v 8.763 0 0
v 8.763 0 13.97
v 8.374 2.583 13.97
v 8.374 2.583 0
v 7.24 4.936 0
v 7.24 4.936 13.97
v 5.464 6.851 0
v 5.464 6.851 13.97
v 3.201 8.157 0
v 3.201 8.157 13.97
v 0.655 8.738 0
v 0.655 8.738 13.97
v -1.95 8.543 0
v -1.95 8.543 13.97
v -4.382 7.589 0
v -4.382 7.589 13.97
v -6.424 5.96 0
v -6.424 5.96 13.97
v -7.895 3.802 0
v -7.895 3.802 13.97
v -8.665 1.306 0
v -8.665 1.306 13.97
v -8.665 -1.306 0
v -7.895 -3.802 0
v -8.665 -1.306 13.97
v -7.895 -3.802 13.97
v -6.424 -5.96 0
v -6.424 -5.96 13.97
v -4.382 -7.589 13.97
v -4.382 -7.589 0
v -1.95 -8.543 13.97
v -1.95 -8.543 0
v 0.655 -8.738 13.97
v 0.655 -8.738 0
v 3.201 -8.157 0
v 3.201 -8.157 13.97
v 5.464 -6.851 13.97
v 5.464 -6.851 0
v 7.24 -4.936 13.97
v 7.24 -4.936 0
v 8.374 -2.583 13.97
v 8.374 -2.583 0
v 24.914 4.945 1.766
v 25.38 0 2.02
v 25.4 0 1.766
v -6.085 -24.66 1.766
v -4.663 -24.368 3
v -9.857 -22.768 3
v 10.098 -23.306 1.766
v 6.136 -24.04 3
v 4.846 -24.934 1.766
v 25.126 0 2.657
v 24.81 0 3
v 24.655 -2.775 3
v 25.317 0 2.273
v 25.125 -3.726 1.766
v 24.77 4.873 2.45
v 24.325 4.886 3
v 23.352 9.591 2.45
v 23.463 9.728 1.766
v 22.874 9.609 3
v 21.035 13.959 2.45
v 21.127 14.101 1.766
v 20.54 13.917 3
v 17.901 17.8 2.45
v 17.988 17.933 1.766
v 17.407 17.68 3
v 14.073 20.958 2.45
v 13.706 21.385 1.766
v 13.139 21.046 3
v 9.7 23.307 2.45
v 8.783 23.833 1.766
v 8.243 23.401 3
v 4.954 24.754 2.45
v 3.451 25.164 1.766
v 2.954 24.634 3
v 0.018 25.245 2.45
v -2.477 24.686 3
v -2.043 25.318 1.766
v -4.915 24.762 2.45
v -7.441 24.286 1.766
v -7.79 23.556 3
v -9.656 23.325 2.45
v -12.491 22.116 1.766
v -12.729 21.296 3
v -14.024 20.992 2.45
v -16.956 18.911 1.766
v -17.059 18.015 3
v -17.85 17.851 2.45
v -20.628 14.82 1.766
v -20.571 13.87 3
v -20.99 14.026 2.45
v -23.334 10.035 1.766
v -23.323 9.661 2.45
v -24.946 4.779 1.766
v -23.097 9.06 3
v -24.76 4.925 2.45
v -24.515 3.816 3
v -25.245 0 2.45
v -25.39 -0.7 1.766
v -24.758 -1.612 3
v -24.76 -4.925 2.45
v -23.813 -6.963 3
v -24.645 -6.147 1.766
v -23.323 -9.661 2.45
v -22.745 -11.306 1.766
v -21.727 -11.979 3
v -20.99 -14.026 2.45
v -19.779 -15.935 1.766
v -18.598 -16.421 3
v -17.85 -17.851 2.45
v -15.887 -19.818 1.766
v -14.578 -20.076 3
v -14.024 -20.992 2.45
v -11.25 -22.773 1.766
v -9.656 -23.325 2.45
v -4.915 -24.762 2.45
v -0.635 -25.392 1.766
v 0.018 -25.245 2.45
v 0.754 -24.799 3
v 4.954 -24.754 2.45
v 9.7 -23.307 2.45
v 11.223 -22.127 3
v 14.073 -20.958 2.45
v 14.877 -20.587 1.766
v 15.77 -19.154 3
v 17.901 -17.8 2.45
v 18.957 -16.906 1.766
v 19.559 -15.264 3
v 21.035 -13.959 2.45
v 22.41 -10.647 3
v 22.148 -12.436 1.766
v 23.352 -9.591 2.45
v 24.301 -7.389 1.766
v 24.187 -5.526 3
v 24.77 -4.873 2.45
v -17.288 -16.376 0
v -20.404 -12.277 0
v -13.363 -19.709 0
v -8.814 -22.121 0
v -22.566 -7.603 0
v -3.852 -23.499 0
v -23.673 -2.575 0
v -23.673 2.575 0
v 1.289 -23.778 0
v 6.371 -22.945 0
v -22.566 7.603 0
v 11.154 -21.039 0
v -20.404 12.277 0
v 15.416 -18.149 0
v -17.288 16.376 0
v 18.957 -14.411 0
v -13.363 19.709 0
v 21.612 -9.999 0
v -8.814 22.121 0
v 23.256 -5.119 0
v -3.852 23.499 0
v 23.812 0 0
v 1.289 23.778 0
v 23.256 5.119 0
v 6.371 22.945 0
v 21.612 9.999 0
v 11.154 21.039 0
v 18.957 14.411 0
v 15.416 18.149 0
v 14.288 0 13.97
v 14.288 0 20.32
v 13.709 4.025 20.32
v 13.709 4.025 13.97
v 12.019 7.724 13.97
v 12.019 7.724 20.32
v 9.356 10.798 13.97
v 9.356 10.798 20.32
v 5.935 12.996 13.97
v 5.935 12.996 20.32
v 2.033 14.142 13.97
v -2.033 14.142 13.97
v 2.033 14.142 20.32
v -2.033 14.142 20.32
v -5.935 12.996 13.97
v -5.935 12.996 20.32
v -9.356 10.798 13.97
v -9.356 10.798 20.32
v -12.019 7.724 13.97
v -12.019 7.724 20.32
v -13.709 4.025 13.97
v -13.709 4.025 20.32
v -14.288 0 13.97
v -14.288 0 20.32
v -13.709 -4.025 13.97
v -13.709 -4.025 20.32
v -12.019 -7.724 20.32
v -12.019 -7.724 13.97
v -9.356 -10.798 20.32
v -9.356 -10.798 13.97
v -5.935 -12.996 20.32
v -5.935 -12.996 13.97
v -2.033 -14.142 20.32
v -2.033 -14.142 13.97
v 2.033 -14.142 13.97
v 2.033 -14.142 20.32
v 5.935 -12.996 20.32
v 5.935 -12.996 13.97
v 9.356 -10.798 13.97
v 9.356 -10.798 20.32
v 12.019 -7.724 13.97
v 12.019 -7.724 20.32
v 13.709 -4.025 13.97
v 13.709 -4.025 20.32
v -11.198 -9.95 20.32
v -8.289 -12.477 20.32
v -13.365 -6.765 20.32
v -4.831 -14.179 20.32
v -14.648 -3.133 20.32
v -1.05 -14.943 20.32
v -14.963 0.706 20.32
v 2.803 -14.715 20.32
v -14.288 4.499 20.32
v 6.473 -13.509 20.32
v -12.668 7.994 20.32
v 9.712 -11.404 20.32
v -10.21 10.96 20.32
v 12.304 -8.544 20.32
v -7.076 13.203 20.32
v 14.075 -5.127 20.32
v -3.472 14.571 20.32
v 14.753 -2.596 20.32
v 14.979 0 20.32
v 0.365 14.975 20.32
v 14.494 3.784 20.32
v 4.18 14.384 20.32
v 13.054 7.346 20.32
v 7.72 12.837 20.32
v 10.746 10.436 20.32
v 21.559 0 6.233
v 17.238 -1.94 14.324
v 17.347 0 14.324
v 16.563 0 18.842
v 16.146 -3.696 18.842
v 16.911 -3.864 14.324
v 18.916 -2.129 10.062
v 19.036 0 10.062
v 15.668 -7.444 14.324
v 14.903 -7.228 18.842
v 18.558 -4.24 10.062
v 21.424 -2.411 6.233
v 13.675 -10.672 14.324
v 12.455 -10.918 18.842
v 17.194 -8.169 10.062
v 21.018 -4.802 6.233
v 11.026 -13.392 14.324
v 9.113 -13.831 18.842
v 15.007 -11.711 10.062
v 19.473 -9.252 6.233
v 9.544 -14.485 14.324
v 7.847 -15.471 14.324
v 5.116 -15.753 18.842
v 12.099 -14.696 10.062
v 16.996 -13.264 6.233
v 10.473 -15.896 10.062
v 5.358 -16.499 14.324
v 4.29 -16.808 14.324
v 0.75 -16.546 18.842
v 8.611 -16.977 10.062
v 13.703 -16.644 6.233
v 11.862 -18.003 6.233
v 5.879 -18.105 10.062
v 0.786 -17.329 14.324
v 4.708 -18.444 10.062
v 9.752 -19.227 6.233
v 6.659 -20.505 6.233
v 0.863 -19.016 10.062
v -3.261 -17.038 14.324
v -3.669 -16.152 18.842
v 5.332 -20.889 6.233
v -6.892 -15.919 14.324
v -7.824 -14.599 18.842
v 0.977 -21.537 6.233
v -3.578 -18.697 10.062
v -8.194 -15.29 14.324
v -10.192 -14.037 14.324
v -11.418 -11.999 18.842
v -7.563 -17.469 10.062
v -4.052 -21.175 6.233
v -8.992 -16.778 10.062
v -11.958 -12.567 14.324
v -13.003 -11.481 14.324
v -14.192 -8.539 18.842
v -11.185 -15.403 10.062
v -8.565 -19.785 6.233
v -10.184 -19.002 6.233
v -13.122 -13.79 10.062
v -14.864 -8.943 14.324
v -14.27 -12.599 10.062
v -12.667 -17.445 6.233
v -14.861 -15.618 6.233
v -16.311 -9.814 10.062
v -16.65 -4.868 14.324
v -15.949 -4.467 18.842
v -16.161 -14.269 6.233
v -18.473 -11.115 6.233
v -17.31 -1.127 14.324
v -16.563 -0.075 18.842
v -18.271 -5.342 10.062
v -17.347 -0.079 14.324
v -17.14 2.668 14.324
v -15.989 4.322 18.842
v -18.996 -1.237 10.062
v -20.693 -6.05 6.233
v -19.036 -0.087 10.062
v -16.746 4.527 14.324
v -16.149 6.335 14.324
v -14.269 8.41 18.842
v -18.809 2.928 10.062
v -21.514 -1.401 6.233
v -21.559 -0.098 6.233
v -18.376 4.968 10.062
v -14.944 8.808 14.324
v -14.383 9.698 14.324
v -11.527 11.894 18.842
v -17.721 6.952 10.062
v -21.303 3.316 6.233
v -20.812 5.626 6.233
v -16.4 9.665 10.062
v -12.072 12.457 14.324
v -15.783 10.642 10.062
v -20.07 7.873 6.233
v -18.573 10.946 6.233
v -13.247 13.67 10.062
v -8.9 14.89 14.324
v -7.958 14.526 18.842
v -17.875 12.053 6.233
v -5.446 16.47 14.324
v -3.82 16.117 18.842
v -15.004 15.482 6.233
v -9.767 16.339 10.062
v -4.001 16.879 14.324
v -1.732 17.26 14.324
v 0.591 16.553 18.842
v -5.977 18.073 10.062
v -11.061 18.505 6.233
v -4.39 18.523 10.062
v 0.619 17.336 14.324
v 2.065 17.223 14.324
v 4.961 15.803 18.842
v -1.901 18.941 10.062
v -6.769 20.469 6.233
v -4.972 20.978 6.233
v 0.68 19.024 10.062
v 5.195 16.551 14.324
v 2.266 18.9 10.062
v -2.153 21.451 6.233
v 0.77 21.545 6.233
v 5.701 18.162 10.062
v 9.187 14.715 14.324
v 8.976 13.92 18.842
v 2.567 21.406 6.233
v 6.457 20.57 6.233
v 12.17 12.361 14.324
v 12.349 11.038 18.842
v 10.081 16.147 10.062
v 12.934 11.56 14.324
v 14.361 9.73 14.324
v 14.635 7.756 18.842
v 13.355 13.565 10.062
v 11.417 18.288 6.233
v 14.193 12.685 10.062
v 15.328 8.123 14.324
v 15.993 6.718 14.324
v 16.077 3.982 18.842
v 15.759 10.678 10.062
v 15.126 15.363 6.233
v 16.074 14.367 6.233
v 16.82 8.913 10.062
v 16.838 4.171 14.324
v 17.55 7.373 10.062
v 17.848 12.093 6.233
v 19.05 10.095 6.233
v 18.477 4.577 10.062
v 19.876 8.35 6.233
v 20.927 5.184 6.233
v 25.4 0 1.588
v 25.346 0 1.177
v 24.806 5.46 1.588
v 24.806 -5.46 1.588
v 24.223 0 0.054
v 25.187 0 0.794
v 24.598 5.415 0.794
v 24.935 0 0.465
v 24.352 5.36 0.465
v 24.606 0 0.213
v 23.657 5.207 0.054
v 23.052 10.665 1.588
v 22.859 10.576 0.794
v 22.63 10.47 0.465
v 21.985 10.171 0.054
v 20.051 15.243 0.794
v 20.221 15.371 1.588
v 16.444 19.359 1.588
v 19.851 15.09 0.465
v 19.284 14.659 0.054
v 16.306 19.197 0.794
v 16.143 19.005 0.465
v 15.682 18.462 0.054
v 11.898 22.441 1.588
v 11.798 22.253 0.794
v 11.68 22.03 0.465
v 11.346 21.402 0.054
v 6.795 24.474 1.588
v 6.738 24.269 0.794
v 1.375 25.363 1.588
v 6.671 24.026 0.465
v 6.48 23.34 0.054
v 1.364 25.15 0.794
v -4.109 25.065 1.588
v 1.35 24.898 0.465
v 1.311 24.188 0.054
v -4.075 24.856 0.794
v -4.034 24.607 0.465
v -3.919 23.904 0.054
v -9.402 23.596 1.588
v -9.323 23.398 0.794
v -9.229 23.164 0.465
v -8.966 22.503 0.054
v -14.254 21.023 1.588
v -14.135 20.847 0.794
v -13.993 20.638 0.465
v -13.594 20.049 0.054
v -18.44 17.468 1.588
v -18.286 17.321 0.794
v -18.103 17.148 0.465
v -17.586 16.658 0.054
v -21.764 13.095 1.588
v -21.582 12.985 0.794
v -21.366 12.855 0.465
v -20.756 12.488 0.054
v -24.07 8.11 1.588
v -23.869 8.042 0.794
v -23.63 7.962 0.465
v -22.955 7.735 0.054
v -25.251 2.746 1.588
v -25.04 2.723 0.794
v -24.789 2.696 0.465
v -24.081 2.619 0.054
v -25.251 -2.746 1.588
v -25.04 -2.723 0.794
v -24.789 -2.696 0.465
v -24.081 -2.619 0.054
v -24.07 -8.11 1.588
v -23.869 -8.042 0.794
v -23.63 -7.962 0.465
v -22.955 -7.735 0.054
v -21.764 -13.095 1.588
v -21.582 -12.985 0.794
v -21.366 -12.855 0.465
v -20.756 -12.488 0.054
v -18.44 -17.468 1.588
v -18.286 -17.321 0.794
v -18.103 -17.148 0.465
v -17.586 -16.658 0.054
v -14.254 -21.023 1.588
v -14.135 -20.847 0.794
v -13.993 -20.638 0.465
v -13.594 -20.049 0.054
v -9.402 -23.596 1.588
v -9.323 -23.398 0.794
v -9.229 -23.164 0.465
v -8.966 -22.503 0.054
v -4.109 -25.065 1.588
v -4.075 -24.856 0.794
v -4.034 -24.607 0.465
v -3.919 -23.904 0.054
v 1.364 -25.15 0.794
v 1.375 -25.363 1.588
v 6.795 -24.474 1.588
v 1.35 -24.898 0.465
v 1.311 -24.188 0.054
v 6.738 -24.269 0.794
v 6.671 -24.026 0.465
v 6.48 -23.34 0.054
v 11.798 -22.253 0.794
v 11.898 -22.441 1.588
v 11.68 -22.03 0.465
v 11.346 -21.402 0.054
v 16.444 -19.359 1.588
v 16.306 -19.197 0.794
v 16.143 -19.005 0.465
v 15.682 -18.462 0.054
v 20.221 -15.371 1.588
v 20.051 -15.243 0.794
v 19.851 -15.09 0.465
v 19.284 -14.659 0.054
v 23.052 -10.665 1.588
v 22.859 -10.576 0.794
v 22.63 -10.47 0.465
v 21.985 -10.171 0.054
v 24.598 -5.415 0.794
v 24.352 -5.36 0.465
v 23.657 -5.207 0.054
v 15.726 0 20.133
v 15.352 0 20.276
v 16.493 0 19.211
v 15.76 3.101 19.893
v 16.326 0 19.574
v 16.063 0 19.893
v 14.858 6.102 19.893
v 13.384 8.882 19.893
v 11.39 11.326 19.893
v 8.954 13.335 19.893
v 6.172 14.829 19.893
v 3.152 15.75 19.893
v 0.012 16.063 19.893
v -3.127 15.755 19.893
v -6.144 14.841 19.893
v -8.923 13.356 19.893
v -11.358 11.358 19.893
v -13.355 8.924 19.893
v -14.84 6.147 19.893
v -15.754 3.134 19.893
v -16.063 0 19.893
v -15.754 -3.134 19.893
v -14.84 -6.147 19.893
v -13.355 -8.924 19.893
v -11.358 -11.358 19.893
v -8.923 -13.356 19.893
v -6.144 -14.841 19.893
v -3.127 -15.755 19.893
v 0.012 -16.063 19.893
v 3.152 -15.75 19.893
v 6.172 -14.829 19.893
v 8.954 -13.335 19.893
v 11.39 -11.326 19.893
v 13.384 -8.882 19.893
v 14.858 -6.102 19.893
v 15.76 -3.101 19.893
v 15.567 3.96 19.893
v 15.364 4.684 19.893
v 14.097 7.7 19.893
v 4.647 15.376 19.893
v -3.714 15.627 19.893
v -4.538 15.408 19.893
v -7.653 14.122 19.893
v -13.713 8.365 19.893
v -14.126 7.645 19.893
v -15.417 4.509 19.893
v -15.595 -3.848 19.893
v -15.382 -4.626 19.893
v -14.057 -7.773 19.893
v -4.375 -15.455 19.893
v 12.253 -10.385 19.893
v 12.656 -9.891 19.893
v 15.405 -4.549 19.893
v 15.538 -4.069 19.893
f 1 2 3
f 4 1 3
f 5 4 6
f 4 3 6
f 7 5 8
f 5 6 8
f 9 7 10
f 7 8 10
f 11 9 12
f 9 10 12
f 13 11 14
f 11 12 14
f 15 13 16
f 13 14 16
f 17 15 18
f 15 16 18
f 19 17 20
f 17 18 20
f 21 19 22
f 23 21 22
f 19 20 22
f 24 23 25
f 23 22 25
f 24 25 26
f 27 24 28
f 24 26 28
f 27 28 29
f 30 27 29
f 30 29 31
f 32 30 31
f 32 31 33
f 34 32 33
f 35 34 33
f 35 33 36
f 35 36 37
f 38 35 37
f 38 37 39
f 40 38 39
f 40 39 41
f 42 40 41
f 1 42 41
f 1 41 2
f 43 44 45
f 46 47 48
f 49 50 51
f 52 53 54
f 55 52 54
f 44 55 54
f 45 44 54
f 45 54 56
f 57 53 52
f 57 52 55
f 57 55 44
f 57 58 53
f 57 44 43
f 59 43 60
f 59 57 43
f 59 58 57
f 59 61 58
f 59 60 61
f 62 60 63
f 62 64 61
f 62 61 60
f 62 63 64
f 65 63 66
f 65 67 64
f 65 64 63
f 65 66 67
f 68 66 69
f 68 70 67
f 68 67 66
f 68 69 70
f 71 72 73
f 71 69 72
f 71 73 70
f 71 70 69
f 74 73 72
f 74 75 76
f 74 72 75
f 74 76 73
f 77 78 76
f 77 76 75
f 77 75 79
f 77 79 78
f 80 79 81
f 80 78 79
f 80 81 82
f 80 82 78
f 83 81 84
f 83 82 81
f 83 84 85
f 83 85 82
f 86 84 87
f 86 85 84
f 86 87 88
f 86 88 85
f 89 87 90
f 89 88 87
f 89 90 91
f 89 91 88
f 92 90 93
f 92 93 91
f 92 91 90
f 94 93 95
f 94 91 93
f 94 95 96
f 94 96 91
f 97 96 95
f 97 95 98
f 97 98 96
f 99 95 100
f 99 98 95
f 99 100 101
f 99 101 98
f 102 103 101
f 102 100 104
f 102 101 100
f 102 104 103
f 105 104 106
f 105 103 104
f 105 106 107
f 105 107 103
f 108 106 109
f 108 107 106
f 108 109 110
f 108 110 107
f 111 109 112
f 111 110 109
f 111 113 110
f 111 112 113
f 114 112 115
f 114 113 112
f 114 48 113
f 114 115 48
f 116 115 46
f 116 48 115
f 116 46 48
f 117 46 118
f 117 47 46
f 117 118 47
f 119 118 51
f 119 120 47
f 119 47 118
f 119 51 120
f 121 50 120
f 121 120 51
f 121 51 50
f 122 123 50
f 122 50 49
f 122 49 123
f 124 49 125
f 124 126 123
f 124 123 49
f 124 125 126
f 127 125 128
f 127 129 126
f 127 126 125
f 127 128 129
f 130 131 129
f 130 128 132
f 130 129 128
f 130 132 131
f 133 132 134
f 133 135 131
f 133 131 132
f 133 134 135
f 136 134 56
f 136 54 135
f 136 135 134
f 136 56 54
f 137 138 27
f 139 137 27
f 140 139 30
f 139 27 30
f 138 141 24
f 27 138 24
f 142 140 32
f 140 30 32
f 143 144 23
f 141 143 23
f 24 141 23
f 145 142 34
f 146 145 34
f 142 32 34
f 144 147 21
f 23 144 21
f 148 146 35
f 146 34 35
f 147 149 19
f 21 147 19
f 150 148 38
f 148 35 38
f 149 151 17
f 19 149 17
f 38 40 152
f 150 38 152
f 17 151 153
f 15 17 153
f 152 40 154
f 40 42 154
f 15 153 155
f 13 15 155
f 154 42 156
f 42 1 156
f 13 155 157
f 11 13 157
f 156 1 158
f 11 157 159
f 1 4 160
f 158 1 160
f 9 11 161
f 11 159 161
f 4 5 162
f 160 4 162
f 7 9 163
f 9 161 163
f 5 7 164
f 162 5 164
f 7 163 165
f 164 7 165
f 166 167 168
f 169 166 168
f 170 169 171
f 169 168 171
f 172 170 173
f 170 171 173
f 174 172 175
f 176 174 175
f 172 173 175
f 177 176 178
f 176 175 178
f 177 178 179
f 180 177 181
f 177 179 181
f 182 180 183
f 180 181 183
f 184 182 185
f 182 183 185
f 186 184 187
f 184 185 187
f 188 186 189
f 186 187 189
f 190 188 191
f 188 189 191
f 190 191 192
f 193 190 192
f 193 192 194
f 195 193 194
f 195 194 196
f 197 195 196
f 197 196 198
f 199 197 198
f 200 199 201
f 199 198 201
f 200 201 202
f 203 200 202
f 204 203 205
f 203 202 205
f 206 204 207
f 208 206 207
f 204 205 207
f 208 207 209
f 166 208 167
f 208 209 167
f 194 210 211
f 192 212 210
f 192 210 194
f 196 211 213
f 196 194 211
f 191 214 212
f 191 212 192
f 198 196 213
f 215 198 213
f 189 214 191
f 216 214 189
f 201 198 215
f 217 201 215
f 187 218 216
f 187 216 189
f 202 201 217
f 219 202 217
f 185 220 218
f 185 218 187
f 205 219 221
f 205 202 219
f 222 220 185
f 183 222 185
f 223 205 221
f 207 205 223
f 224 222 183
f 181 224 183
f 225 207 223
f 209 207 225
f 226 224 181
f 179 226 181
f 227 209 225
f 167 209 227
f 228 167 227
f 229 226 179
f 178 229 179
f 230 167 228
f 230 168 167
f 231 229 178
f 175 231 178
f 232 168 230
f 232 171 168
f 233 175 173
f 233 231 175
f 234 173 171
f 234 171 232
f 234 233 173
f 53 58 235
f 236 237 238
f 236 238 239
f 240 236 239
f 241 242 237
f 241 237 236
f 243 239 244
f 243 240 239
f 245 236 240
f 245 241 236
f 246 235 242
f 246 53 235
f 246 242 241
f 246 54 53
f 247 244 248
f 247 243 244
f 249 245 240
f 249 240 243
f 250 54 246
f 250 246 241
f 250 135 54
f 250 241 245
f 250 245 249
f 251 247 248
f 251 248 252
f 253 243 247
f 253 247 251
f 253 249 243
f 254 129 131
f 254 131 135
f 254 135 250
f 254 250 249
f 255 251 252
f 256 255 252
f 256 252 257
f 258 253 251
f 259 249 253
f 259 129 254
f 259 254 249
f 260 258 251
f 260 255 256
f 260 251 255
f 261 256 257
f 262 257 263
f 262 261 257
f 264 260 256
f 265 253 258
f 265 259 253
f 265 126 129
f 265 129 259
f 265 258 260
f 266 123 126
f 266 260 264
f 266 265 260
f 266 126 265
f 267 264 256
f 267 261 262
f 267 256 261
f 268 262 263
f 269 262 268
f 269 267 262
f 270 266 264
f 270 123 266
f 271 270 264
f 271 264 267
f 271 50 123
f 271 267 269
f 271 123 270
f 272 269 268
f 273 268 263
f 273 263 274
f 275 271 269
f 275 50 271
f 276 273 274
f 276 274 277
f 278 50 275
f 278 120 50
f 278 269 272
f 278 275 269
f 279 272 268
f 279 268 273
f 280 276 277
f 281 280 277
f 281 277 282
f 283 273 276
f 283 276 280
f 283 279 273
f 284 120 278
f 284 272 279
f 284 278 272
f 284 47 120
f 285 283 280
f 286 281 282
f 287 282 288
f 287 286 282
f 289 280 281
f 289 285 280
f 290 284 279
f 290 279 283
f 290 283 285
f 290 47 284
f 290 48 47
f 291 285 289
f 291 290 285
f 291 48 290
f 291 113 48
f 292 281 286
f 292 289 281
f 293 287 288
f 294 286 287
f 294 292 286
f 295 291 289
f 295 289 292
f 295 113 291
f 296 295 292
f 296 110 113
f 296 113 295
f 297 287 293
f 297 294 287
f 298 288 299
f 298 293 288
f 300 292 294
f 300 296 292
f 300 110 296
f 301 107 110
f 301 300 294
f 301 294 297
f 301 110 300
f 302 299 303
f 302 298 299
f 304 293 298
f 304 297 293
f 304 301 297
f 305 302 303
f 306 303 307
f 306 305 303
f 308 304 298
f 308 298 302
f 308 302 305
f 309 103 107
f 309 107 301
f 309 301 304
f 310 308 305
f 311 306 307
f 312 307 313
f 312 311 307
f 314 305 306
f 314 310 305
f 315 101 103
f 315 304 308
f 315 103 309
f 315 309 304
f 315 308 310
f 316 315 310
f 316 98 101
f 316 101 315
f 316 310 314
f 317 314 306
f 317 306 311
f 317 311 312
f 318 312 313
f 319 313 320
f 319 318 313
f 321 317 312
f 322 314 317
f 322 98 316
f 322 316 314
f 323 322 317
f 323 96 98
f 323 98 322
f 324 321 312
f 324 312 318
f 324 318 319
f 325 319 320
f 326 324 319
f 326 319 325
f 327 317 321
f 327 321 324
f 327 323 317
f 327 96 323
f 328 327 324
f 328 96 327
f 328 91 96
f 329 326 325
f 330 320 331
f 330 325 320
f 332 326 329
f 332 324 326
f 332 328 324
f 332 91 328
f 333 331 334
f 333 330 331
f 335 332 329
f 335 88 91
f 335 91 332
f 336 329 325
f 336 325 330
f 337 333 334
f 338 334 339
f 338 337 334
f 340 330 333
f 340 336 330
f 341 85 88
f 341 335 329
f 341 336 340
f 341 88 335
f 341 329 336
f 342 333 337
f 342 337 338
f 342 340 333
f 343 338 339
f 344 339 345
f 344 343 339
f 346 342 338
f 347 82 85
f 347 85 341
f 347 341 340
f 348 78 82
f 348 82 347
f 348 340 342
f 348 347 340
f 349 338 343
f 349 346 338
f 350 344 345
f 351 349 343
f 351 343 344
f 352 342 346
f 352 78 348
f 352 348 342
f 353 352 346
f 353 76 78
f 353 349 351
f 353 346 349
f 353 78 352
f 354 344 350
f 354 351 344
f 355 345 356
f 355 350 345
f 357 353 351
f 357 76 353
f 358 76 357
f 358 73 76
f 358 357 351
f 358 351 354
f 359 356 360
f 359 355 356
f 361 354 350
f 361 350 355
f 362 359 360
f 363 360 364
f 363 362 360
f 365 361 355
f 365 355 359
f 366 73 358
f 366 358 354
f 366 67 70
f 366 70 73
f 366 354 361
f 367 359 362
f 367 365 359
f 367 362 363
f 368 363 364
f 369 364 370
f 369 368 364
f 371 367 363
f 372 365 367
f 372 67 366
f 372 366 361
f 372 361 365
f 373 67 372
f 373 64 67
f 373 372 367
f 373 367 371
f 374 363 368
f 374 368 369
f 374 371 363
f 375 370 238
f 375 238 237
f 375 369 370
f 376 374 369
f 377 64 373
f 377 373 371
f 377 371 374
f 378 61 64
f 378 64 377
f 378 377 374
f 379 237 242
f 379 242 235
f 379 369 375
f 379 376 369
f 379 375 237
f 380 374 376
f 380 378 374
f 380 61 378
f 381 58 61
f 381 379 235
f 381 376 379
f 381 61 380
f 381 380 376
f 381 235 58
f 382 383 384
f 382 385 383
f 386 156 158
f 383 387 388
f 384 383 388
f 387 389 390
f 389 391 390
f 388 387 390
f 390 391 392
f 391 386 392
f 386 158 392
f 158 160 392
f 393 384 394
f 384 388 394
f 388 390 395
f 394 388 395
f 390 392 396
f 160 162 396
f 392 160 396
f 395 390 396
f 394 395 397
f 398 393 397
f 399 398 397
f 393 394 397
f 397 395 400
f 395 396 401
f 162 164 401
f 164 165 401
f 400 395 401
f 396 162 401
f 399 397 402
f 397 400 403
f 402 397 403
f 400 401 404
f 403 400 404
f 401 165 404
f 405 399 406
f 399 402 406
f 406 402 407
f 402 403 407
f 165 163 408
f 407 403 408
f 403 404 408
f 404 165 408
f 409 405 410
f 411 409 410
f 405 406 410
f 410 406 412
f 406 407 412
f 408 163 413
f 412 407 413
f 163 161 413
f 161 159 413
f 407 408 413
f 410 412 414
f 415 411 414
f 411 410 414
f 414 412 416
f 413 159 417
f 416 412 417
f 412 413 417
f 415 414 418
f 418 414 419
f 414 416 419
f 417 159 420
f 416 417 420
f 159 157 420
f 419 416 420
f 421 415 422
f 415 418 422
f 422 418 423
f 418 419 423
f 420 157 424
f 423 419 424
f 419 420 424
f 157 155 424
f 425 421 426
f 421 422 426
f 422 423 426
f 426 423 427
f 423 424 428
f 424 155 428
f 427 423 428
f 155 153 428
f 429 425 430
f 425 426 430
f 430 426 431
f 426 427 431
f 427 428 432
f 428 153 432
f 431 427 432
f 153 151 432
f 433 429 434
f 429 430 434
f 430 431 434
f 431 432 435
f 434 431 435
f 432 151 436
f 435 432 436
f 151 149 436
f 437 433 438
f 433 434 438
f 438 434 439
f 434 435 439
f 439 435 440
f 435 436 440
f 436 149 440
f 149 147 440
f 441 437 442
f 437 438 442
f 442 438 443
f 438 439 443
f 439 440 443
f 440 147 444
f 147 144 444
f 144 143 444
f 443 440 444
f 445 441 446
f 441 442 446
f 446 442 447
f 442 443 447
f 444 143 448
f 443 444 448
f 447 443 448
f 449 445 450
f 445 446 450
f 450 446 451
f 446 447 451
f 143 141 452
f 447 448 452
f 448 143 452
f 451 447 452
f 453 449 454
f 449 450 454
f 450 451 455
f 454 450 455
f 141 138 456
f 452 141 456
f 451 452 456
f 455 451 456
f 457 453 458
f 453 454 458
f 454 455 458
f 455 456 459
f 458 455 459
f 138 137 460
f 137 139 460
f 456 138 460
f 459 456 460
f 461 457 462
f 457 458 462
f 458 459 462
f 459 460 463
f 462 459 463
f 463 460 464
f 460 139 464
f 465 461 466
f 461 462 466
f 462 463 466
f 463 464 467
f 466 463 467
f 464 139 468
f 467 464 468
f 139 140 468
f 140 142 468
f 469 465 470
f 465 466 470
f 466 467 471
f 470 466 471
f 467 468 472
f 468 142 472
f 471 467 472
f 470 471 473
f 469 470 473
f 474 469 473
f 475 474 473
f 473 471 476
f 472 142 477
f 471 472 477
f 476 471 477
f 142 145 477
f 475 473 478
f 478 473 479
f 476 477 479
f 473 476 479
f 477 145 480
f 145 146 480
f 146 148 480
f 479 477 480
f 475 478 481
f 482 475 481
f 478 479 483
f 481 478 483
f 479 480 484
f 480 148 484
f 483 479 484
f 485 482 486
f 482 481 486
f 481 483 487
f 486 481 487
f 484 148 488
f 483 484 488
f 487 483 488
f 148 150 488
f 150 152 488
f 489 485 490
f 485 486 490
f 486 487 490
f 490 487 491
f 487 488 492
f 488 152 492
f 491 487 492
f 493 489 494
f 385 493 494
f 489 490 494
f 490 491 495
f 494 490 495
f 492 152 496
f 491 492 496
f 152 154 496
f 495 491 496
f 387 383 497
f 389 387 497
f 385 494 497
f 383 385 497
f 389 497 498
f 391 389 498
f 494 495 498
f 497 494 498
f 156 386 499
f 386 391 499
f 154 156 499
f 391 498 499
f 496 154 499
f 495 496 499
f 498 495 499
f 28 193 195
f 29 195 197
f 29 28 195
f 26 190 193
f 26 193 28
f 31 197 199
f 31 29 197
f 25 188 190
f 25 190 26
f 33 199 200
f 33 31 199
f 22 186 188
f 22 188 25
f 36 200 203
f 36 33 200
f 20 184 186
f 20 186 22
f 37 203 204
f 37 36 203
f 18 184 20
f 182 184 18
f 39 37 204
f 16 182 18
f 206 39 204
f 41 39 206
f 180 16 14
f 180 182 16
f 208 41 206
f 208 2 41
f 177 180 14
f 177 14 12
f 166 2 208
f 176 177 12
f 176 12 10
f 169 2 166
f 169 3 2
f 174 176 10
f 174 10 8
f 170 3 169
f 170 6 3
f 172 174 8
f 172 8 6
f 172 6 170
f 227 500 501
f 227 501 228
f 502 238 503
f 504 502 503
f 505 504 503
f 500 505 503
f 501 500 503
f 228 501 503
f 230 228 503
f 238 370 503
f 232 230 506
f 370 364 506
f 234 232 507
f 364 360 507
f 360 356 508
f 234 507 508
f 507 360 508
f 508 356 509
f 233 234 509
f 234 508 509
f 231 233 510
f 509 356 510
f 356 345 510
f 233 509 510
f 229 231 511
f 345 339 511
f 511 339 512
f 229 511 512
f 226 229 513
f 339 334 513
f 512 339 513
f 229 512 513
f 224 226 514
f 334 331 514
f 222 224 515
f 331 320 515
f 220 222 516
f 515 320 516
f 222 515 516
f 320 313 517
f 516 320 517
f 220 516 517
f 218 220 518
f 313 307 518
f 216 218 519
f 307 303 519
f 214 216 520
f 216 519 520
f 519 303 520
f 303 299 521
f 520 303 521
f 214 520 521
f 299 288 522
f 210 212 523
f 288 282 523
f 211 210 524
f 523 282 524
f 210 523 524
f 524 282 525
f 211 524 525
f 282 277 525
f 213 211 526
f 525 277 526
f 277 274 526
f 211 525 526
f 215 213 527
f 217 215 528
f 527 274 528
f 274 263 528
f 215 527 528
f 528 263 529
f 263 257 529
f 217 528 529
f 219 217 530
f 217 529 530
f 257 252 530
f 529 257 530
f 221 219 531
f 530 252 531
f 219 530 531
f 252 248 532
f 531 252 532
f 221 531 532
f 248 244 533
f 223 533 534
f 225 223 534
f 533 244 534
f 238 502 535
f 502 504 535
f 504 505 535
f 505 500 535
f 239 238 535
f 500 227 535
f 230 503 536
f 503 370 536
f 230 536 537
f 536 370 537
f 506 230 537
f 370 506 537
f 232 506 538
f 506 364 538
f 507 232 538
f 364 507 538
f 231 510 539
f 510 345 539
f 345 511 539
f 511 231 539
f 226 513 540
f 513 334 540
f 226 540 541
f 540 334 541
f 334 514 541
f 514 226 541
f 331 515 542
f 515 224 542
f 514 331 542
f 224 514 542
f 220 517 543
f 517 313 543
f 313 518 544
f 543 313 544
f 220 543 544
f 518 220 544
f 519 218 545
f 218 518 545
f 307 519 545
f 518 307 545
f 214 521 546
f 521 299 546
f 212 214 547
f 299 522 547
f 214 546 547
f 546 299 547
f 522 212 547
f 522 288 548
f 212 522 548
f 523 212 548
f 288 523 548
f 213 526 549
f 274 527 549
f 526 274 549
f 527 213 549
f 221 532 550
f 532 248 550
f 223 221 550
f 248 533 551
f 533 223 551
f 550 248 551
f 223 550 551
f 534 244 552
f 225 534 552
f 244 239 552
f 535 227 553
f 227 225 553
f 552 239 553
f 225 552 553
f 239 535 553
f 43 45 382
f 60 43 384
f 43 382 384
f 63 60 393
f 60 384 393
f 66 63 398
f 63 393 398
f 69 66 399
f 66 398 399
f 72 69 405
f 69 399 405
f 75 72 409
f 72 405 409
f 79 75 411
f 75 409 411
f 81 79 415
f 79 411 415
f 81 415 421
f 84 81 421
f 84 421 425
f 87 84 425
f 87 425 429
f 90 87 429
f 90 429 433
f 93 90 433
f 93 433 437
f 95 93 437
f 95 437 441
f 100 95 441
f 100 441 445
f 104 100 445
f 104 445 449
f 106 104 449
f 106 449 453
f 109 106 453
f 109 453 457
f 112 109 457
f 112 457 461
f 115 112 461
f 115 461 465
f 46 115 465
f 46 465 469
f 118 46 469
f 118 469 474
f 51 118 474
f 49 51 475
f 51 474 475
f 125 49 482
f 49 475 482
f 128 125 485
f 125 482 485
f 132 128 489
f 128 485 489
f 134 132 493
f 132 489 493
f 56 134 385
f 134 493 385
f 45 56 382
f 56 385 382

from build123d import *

# Parameters (mm, degrees)
SKETCH1_R           = 25.4
BOSS_EXTRUDE1_DEPTH = 20.32
SKETCH2_R           = 14.2875
CUT_EXTRUDE1_DEPTH  = 6.35
CUT_EXTRUDE2_START  = -17.78
SKETCH3_R           = 25.4
SKETCH3_R_2         = 16.51
CUT_EXTRUDE2_DEPTH  = 17.78
SKETCH6_R           = 8.763
CUT_EXTRUDE3_DEPTH  = 39.5419369
FILLET1_R           = 1.5875


with BuildPart() as part:
    # Sketch1 → Boss-Extrude1 (new body)
    with BuildSketch(Plane.XY):
        Circle(SKETCH1_R)
    extrude(amount=BOSS_EXTRUDE1_DEPTH)

    # Sketch2 → Cut-Extrude1 (cut)
    with BuildSketch(Plane.XY.offset(20.32)):
        Circle(SKETCH2_R)
    extrude(amount=-CUT_EXTRUDE1_DEPTH, mode=Mode.SUBTRACT)

    # Sketch3 → Cut-Extrude2 (cut)
    with BuildSketch(Plane.XY.offset(20.32).offset(CUT_EXTRUDE2_START)):
        Circle(SKETCH3_R)
        Circle(SKETCH3_R_2, mode=Mode.SUBTRACT)
    extrude(amount=CUT_EXTRUDE2_DEPTH, mode=Mode.SUBTRACT)

    # Sketch5 → Revolve1 (revolve)
    with BuildSketch(Plane(origin=(0, 0, 0), x_dir=(1, 0, 0), z_dir=(0, 1, 0)), mode=Mode.PRIVATE) as revolve1_sk:
        with BuildLine():
            Line((-25.4, -2.54), (-16.51, -2.54))
            Line((-16.51, -2.54), (-16.51, -20.32))
            ThreePointArc((-16.51, -20.32), (-18.869673356, -10.387336678), (-25.4, -2.54))
        make_face()
    revolve(revolve1_sk.sketch.rotate(Axis((0, 0, 0), (0, 0, -1)), 180), axis=Axis((0, 0, 0), (0, 0, -1)))

    # Sketch6 → Cut-Extrude3 (cut, through all)
    with BuildSketch(Plane.XY.offset(13.97)):
        Circle(SKETCH6_R)
    extrude(amount=-CUT_EXTRUDE3_DEPTH, mode=Mode.SUBTRACT)

    # Fillet1
    fillet1_edges = [part.edges().sort_by_distance(p)[0] for p in [
        (-25.4, 0, 2.54),
        (-16.51, 0, 20.32),
        (-25.4, 0, 0),
    ]]
    fillet(fillet1_edges, radius=FILLET1_R)


solid = part.part
